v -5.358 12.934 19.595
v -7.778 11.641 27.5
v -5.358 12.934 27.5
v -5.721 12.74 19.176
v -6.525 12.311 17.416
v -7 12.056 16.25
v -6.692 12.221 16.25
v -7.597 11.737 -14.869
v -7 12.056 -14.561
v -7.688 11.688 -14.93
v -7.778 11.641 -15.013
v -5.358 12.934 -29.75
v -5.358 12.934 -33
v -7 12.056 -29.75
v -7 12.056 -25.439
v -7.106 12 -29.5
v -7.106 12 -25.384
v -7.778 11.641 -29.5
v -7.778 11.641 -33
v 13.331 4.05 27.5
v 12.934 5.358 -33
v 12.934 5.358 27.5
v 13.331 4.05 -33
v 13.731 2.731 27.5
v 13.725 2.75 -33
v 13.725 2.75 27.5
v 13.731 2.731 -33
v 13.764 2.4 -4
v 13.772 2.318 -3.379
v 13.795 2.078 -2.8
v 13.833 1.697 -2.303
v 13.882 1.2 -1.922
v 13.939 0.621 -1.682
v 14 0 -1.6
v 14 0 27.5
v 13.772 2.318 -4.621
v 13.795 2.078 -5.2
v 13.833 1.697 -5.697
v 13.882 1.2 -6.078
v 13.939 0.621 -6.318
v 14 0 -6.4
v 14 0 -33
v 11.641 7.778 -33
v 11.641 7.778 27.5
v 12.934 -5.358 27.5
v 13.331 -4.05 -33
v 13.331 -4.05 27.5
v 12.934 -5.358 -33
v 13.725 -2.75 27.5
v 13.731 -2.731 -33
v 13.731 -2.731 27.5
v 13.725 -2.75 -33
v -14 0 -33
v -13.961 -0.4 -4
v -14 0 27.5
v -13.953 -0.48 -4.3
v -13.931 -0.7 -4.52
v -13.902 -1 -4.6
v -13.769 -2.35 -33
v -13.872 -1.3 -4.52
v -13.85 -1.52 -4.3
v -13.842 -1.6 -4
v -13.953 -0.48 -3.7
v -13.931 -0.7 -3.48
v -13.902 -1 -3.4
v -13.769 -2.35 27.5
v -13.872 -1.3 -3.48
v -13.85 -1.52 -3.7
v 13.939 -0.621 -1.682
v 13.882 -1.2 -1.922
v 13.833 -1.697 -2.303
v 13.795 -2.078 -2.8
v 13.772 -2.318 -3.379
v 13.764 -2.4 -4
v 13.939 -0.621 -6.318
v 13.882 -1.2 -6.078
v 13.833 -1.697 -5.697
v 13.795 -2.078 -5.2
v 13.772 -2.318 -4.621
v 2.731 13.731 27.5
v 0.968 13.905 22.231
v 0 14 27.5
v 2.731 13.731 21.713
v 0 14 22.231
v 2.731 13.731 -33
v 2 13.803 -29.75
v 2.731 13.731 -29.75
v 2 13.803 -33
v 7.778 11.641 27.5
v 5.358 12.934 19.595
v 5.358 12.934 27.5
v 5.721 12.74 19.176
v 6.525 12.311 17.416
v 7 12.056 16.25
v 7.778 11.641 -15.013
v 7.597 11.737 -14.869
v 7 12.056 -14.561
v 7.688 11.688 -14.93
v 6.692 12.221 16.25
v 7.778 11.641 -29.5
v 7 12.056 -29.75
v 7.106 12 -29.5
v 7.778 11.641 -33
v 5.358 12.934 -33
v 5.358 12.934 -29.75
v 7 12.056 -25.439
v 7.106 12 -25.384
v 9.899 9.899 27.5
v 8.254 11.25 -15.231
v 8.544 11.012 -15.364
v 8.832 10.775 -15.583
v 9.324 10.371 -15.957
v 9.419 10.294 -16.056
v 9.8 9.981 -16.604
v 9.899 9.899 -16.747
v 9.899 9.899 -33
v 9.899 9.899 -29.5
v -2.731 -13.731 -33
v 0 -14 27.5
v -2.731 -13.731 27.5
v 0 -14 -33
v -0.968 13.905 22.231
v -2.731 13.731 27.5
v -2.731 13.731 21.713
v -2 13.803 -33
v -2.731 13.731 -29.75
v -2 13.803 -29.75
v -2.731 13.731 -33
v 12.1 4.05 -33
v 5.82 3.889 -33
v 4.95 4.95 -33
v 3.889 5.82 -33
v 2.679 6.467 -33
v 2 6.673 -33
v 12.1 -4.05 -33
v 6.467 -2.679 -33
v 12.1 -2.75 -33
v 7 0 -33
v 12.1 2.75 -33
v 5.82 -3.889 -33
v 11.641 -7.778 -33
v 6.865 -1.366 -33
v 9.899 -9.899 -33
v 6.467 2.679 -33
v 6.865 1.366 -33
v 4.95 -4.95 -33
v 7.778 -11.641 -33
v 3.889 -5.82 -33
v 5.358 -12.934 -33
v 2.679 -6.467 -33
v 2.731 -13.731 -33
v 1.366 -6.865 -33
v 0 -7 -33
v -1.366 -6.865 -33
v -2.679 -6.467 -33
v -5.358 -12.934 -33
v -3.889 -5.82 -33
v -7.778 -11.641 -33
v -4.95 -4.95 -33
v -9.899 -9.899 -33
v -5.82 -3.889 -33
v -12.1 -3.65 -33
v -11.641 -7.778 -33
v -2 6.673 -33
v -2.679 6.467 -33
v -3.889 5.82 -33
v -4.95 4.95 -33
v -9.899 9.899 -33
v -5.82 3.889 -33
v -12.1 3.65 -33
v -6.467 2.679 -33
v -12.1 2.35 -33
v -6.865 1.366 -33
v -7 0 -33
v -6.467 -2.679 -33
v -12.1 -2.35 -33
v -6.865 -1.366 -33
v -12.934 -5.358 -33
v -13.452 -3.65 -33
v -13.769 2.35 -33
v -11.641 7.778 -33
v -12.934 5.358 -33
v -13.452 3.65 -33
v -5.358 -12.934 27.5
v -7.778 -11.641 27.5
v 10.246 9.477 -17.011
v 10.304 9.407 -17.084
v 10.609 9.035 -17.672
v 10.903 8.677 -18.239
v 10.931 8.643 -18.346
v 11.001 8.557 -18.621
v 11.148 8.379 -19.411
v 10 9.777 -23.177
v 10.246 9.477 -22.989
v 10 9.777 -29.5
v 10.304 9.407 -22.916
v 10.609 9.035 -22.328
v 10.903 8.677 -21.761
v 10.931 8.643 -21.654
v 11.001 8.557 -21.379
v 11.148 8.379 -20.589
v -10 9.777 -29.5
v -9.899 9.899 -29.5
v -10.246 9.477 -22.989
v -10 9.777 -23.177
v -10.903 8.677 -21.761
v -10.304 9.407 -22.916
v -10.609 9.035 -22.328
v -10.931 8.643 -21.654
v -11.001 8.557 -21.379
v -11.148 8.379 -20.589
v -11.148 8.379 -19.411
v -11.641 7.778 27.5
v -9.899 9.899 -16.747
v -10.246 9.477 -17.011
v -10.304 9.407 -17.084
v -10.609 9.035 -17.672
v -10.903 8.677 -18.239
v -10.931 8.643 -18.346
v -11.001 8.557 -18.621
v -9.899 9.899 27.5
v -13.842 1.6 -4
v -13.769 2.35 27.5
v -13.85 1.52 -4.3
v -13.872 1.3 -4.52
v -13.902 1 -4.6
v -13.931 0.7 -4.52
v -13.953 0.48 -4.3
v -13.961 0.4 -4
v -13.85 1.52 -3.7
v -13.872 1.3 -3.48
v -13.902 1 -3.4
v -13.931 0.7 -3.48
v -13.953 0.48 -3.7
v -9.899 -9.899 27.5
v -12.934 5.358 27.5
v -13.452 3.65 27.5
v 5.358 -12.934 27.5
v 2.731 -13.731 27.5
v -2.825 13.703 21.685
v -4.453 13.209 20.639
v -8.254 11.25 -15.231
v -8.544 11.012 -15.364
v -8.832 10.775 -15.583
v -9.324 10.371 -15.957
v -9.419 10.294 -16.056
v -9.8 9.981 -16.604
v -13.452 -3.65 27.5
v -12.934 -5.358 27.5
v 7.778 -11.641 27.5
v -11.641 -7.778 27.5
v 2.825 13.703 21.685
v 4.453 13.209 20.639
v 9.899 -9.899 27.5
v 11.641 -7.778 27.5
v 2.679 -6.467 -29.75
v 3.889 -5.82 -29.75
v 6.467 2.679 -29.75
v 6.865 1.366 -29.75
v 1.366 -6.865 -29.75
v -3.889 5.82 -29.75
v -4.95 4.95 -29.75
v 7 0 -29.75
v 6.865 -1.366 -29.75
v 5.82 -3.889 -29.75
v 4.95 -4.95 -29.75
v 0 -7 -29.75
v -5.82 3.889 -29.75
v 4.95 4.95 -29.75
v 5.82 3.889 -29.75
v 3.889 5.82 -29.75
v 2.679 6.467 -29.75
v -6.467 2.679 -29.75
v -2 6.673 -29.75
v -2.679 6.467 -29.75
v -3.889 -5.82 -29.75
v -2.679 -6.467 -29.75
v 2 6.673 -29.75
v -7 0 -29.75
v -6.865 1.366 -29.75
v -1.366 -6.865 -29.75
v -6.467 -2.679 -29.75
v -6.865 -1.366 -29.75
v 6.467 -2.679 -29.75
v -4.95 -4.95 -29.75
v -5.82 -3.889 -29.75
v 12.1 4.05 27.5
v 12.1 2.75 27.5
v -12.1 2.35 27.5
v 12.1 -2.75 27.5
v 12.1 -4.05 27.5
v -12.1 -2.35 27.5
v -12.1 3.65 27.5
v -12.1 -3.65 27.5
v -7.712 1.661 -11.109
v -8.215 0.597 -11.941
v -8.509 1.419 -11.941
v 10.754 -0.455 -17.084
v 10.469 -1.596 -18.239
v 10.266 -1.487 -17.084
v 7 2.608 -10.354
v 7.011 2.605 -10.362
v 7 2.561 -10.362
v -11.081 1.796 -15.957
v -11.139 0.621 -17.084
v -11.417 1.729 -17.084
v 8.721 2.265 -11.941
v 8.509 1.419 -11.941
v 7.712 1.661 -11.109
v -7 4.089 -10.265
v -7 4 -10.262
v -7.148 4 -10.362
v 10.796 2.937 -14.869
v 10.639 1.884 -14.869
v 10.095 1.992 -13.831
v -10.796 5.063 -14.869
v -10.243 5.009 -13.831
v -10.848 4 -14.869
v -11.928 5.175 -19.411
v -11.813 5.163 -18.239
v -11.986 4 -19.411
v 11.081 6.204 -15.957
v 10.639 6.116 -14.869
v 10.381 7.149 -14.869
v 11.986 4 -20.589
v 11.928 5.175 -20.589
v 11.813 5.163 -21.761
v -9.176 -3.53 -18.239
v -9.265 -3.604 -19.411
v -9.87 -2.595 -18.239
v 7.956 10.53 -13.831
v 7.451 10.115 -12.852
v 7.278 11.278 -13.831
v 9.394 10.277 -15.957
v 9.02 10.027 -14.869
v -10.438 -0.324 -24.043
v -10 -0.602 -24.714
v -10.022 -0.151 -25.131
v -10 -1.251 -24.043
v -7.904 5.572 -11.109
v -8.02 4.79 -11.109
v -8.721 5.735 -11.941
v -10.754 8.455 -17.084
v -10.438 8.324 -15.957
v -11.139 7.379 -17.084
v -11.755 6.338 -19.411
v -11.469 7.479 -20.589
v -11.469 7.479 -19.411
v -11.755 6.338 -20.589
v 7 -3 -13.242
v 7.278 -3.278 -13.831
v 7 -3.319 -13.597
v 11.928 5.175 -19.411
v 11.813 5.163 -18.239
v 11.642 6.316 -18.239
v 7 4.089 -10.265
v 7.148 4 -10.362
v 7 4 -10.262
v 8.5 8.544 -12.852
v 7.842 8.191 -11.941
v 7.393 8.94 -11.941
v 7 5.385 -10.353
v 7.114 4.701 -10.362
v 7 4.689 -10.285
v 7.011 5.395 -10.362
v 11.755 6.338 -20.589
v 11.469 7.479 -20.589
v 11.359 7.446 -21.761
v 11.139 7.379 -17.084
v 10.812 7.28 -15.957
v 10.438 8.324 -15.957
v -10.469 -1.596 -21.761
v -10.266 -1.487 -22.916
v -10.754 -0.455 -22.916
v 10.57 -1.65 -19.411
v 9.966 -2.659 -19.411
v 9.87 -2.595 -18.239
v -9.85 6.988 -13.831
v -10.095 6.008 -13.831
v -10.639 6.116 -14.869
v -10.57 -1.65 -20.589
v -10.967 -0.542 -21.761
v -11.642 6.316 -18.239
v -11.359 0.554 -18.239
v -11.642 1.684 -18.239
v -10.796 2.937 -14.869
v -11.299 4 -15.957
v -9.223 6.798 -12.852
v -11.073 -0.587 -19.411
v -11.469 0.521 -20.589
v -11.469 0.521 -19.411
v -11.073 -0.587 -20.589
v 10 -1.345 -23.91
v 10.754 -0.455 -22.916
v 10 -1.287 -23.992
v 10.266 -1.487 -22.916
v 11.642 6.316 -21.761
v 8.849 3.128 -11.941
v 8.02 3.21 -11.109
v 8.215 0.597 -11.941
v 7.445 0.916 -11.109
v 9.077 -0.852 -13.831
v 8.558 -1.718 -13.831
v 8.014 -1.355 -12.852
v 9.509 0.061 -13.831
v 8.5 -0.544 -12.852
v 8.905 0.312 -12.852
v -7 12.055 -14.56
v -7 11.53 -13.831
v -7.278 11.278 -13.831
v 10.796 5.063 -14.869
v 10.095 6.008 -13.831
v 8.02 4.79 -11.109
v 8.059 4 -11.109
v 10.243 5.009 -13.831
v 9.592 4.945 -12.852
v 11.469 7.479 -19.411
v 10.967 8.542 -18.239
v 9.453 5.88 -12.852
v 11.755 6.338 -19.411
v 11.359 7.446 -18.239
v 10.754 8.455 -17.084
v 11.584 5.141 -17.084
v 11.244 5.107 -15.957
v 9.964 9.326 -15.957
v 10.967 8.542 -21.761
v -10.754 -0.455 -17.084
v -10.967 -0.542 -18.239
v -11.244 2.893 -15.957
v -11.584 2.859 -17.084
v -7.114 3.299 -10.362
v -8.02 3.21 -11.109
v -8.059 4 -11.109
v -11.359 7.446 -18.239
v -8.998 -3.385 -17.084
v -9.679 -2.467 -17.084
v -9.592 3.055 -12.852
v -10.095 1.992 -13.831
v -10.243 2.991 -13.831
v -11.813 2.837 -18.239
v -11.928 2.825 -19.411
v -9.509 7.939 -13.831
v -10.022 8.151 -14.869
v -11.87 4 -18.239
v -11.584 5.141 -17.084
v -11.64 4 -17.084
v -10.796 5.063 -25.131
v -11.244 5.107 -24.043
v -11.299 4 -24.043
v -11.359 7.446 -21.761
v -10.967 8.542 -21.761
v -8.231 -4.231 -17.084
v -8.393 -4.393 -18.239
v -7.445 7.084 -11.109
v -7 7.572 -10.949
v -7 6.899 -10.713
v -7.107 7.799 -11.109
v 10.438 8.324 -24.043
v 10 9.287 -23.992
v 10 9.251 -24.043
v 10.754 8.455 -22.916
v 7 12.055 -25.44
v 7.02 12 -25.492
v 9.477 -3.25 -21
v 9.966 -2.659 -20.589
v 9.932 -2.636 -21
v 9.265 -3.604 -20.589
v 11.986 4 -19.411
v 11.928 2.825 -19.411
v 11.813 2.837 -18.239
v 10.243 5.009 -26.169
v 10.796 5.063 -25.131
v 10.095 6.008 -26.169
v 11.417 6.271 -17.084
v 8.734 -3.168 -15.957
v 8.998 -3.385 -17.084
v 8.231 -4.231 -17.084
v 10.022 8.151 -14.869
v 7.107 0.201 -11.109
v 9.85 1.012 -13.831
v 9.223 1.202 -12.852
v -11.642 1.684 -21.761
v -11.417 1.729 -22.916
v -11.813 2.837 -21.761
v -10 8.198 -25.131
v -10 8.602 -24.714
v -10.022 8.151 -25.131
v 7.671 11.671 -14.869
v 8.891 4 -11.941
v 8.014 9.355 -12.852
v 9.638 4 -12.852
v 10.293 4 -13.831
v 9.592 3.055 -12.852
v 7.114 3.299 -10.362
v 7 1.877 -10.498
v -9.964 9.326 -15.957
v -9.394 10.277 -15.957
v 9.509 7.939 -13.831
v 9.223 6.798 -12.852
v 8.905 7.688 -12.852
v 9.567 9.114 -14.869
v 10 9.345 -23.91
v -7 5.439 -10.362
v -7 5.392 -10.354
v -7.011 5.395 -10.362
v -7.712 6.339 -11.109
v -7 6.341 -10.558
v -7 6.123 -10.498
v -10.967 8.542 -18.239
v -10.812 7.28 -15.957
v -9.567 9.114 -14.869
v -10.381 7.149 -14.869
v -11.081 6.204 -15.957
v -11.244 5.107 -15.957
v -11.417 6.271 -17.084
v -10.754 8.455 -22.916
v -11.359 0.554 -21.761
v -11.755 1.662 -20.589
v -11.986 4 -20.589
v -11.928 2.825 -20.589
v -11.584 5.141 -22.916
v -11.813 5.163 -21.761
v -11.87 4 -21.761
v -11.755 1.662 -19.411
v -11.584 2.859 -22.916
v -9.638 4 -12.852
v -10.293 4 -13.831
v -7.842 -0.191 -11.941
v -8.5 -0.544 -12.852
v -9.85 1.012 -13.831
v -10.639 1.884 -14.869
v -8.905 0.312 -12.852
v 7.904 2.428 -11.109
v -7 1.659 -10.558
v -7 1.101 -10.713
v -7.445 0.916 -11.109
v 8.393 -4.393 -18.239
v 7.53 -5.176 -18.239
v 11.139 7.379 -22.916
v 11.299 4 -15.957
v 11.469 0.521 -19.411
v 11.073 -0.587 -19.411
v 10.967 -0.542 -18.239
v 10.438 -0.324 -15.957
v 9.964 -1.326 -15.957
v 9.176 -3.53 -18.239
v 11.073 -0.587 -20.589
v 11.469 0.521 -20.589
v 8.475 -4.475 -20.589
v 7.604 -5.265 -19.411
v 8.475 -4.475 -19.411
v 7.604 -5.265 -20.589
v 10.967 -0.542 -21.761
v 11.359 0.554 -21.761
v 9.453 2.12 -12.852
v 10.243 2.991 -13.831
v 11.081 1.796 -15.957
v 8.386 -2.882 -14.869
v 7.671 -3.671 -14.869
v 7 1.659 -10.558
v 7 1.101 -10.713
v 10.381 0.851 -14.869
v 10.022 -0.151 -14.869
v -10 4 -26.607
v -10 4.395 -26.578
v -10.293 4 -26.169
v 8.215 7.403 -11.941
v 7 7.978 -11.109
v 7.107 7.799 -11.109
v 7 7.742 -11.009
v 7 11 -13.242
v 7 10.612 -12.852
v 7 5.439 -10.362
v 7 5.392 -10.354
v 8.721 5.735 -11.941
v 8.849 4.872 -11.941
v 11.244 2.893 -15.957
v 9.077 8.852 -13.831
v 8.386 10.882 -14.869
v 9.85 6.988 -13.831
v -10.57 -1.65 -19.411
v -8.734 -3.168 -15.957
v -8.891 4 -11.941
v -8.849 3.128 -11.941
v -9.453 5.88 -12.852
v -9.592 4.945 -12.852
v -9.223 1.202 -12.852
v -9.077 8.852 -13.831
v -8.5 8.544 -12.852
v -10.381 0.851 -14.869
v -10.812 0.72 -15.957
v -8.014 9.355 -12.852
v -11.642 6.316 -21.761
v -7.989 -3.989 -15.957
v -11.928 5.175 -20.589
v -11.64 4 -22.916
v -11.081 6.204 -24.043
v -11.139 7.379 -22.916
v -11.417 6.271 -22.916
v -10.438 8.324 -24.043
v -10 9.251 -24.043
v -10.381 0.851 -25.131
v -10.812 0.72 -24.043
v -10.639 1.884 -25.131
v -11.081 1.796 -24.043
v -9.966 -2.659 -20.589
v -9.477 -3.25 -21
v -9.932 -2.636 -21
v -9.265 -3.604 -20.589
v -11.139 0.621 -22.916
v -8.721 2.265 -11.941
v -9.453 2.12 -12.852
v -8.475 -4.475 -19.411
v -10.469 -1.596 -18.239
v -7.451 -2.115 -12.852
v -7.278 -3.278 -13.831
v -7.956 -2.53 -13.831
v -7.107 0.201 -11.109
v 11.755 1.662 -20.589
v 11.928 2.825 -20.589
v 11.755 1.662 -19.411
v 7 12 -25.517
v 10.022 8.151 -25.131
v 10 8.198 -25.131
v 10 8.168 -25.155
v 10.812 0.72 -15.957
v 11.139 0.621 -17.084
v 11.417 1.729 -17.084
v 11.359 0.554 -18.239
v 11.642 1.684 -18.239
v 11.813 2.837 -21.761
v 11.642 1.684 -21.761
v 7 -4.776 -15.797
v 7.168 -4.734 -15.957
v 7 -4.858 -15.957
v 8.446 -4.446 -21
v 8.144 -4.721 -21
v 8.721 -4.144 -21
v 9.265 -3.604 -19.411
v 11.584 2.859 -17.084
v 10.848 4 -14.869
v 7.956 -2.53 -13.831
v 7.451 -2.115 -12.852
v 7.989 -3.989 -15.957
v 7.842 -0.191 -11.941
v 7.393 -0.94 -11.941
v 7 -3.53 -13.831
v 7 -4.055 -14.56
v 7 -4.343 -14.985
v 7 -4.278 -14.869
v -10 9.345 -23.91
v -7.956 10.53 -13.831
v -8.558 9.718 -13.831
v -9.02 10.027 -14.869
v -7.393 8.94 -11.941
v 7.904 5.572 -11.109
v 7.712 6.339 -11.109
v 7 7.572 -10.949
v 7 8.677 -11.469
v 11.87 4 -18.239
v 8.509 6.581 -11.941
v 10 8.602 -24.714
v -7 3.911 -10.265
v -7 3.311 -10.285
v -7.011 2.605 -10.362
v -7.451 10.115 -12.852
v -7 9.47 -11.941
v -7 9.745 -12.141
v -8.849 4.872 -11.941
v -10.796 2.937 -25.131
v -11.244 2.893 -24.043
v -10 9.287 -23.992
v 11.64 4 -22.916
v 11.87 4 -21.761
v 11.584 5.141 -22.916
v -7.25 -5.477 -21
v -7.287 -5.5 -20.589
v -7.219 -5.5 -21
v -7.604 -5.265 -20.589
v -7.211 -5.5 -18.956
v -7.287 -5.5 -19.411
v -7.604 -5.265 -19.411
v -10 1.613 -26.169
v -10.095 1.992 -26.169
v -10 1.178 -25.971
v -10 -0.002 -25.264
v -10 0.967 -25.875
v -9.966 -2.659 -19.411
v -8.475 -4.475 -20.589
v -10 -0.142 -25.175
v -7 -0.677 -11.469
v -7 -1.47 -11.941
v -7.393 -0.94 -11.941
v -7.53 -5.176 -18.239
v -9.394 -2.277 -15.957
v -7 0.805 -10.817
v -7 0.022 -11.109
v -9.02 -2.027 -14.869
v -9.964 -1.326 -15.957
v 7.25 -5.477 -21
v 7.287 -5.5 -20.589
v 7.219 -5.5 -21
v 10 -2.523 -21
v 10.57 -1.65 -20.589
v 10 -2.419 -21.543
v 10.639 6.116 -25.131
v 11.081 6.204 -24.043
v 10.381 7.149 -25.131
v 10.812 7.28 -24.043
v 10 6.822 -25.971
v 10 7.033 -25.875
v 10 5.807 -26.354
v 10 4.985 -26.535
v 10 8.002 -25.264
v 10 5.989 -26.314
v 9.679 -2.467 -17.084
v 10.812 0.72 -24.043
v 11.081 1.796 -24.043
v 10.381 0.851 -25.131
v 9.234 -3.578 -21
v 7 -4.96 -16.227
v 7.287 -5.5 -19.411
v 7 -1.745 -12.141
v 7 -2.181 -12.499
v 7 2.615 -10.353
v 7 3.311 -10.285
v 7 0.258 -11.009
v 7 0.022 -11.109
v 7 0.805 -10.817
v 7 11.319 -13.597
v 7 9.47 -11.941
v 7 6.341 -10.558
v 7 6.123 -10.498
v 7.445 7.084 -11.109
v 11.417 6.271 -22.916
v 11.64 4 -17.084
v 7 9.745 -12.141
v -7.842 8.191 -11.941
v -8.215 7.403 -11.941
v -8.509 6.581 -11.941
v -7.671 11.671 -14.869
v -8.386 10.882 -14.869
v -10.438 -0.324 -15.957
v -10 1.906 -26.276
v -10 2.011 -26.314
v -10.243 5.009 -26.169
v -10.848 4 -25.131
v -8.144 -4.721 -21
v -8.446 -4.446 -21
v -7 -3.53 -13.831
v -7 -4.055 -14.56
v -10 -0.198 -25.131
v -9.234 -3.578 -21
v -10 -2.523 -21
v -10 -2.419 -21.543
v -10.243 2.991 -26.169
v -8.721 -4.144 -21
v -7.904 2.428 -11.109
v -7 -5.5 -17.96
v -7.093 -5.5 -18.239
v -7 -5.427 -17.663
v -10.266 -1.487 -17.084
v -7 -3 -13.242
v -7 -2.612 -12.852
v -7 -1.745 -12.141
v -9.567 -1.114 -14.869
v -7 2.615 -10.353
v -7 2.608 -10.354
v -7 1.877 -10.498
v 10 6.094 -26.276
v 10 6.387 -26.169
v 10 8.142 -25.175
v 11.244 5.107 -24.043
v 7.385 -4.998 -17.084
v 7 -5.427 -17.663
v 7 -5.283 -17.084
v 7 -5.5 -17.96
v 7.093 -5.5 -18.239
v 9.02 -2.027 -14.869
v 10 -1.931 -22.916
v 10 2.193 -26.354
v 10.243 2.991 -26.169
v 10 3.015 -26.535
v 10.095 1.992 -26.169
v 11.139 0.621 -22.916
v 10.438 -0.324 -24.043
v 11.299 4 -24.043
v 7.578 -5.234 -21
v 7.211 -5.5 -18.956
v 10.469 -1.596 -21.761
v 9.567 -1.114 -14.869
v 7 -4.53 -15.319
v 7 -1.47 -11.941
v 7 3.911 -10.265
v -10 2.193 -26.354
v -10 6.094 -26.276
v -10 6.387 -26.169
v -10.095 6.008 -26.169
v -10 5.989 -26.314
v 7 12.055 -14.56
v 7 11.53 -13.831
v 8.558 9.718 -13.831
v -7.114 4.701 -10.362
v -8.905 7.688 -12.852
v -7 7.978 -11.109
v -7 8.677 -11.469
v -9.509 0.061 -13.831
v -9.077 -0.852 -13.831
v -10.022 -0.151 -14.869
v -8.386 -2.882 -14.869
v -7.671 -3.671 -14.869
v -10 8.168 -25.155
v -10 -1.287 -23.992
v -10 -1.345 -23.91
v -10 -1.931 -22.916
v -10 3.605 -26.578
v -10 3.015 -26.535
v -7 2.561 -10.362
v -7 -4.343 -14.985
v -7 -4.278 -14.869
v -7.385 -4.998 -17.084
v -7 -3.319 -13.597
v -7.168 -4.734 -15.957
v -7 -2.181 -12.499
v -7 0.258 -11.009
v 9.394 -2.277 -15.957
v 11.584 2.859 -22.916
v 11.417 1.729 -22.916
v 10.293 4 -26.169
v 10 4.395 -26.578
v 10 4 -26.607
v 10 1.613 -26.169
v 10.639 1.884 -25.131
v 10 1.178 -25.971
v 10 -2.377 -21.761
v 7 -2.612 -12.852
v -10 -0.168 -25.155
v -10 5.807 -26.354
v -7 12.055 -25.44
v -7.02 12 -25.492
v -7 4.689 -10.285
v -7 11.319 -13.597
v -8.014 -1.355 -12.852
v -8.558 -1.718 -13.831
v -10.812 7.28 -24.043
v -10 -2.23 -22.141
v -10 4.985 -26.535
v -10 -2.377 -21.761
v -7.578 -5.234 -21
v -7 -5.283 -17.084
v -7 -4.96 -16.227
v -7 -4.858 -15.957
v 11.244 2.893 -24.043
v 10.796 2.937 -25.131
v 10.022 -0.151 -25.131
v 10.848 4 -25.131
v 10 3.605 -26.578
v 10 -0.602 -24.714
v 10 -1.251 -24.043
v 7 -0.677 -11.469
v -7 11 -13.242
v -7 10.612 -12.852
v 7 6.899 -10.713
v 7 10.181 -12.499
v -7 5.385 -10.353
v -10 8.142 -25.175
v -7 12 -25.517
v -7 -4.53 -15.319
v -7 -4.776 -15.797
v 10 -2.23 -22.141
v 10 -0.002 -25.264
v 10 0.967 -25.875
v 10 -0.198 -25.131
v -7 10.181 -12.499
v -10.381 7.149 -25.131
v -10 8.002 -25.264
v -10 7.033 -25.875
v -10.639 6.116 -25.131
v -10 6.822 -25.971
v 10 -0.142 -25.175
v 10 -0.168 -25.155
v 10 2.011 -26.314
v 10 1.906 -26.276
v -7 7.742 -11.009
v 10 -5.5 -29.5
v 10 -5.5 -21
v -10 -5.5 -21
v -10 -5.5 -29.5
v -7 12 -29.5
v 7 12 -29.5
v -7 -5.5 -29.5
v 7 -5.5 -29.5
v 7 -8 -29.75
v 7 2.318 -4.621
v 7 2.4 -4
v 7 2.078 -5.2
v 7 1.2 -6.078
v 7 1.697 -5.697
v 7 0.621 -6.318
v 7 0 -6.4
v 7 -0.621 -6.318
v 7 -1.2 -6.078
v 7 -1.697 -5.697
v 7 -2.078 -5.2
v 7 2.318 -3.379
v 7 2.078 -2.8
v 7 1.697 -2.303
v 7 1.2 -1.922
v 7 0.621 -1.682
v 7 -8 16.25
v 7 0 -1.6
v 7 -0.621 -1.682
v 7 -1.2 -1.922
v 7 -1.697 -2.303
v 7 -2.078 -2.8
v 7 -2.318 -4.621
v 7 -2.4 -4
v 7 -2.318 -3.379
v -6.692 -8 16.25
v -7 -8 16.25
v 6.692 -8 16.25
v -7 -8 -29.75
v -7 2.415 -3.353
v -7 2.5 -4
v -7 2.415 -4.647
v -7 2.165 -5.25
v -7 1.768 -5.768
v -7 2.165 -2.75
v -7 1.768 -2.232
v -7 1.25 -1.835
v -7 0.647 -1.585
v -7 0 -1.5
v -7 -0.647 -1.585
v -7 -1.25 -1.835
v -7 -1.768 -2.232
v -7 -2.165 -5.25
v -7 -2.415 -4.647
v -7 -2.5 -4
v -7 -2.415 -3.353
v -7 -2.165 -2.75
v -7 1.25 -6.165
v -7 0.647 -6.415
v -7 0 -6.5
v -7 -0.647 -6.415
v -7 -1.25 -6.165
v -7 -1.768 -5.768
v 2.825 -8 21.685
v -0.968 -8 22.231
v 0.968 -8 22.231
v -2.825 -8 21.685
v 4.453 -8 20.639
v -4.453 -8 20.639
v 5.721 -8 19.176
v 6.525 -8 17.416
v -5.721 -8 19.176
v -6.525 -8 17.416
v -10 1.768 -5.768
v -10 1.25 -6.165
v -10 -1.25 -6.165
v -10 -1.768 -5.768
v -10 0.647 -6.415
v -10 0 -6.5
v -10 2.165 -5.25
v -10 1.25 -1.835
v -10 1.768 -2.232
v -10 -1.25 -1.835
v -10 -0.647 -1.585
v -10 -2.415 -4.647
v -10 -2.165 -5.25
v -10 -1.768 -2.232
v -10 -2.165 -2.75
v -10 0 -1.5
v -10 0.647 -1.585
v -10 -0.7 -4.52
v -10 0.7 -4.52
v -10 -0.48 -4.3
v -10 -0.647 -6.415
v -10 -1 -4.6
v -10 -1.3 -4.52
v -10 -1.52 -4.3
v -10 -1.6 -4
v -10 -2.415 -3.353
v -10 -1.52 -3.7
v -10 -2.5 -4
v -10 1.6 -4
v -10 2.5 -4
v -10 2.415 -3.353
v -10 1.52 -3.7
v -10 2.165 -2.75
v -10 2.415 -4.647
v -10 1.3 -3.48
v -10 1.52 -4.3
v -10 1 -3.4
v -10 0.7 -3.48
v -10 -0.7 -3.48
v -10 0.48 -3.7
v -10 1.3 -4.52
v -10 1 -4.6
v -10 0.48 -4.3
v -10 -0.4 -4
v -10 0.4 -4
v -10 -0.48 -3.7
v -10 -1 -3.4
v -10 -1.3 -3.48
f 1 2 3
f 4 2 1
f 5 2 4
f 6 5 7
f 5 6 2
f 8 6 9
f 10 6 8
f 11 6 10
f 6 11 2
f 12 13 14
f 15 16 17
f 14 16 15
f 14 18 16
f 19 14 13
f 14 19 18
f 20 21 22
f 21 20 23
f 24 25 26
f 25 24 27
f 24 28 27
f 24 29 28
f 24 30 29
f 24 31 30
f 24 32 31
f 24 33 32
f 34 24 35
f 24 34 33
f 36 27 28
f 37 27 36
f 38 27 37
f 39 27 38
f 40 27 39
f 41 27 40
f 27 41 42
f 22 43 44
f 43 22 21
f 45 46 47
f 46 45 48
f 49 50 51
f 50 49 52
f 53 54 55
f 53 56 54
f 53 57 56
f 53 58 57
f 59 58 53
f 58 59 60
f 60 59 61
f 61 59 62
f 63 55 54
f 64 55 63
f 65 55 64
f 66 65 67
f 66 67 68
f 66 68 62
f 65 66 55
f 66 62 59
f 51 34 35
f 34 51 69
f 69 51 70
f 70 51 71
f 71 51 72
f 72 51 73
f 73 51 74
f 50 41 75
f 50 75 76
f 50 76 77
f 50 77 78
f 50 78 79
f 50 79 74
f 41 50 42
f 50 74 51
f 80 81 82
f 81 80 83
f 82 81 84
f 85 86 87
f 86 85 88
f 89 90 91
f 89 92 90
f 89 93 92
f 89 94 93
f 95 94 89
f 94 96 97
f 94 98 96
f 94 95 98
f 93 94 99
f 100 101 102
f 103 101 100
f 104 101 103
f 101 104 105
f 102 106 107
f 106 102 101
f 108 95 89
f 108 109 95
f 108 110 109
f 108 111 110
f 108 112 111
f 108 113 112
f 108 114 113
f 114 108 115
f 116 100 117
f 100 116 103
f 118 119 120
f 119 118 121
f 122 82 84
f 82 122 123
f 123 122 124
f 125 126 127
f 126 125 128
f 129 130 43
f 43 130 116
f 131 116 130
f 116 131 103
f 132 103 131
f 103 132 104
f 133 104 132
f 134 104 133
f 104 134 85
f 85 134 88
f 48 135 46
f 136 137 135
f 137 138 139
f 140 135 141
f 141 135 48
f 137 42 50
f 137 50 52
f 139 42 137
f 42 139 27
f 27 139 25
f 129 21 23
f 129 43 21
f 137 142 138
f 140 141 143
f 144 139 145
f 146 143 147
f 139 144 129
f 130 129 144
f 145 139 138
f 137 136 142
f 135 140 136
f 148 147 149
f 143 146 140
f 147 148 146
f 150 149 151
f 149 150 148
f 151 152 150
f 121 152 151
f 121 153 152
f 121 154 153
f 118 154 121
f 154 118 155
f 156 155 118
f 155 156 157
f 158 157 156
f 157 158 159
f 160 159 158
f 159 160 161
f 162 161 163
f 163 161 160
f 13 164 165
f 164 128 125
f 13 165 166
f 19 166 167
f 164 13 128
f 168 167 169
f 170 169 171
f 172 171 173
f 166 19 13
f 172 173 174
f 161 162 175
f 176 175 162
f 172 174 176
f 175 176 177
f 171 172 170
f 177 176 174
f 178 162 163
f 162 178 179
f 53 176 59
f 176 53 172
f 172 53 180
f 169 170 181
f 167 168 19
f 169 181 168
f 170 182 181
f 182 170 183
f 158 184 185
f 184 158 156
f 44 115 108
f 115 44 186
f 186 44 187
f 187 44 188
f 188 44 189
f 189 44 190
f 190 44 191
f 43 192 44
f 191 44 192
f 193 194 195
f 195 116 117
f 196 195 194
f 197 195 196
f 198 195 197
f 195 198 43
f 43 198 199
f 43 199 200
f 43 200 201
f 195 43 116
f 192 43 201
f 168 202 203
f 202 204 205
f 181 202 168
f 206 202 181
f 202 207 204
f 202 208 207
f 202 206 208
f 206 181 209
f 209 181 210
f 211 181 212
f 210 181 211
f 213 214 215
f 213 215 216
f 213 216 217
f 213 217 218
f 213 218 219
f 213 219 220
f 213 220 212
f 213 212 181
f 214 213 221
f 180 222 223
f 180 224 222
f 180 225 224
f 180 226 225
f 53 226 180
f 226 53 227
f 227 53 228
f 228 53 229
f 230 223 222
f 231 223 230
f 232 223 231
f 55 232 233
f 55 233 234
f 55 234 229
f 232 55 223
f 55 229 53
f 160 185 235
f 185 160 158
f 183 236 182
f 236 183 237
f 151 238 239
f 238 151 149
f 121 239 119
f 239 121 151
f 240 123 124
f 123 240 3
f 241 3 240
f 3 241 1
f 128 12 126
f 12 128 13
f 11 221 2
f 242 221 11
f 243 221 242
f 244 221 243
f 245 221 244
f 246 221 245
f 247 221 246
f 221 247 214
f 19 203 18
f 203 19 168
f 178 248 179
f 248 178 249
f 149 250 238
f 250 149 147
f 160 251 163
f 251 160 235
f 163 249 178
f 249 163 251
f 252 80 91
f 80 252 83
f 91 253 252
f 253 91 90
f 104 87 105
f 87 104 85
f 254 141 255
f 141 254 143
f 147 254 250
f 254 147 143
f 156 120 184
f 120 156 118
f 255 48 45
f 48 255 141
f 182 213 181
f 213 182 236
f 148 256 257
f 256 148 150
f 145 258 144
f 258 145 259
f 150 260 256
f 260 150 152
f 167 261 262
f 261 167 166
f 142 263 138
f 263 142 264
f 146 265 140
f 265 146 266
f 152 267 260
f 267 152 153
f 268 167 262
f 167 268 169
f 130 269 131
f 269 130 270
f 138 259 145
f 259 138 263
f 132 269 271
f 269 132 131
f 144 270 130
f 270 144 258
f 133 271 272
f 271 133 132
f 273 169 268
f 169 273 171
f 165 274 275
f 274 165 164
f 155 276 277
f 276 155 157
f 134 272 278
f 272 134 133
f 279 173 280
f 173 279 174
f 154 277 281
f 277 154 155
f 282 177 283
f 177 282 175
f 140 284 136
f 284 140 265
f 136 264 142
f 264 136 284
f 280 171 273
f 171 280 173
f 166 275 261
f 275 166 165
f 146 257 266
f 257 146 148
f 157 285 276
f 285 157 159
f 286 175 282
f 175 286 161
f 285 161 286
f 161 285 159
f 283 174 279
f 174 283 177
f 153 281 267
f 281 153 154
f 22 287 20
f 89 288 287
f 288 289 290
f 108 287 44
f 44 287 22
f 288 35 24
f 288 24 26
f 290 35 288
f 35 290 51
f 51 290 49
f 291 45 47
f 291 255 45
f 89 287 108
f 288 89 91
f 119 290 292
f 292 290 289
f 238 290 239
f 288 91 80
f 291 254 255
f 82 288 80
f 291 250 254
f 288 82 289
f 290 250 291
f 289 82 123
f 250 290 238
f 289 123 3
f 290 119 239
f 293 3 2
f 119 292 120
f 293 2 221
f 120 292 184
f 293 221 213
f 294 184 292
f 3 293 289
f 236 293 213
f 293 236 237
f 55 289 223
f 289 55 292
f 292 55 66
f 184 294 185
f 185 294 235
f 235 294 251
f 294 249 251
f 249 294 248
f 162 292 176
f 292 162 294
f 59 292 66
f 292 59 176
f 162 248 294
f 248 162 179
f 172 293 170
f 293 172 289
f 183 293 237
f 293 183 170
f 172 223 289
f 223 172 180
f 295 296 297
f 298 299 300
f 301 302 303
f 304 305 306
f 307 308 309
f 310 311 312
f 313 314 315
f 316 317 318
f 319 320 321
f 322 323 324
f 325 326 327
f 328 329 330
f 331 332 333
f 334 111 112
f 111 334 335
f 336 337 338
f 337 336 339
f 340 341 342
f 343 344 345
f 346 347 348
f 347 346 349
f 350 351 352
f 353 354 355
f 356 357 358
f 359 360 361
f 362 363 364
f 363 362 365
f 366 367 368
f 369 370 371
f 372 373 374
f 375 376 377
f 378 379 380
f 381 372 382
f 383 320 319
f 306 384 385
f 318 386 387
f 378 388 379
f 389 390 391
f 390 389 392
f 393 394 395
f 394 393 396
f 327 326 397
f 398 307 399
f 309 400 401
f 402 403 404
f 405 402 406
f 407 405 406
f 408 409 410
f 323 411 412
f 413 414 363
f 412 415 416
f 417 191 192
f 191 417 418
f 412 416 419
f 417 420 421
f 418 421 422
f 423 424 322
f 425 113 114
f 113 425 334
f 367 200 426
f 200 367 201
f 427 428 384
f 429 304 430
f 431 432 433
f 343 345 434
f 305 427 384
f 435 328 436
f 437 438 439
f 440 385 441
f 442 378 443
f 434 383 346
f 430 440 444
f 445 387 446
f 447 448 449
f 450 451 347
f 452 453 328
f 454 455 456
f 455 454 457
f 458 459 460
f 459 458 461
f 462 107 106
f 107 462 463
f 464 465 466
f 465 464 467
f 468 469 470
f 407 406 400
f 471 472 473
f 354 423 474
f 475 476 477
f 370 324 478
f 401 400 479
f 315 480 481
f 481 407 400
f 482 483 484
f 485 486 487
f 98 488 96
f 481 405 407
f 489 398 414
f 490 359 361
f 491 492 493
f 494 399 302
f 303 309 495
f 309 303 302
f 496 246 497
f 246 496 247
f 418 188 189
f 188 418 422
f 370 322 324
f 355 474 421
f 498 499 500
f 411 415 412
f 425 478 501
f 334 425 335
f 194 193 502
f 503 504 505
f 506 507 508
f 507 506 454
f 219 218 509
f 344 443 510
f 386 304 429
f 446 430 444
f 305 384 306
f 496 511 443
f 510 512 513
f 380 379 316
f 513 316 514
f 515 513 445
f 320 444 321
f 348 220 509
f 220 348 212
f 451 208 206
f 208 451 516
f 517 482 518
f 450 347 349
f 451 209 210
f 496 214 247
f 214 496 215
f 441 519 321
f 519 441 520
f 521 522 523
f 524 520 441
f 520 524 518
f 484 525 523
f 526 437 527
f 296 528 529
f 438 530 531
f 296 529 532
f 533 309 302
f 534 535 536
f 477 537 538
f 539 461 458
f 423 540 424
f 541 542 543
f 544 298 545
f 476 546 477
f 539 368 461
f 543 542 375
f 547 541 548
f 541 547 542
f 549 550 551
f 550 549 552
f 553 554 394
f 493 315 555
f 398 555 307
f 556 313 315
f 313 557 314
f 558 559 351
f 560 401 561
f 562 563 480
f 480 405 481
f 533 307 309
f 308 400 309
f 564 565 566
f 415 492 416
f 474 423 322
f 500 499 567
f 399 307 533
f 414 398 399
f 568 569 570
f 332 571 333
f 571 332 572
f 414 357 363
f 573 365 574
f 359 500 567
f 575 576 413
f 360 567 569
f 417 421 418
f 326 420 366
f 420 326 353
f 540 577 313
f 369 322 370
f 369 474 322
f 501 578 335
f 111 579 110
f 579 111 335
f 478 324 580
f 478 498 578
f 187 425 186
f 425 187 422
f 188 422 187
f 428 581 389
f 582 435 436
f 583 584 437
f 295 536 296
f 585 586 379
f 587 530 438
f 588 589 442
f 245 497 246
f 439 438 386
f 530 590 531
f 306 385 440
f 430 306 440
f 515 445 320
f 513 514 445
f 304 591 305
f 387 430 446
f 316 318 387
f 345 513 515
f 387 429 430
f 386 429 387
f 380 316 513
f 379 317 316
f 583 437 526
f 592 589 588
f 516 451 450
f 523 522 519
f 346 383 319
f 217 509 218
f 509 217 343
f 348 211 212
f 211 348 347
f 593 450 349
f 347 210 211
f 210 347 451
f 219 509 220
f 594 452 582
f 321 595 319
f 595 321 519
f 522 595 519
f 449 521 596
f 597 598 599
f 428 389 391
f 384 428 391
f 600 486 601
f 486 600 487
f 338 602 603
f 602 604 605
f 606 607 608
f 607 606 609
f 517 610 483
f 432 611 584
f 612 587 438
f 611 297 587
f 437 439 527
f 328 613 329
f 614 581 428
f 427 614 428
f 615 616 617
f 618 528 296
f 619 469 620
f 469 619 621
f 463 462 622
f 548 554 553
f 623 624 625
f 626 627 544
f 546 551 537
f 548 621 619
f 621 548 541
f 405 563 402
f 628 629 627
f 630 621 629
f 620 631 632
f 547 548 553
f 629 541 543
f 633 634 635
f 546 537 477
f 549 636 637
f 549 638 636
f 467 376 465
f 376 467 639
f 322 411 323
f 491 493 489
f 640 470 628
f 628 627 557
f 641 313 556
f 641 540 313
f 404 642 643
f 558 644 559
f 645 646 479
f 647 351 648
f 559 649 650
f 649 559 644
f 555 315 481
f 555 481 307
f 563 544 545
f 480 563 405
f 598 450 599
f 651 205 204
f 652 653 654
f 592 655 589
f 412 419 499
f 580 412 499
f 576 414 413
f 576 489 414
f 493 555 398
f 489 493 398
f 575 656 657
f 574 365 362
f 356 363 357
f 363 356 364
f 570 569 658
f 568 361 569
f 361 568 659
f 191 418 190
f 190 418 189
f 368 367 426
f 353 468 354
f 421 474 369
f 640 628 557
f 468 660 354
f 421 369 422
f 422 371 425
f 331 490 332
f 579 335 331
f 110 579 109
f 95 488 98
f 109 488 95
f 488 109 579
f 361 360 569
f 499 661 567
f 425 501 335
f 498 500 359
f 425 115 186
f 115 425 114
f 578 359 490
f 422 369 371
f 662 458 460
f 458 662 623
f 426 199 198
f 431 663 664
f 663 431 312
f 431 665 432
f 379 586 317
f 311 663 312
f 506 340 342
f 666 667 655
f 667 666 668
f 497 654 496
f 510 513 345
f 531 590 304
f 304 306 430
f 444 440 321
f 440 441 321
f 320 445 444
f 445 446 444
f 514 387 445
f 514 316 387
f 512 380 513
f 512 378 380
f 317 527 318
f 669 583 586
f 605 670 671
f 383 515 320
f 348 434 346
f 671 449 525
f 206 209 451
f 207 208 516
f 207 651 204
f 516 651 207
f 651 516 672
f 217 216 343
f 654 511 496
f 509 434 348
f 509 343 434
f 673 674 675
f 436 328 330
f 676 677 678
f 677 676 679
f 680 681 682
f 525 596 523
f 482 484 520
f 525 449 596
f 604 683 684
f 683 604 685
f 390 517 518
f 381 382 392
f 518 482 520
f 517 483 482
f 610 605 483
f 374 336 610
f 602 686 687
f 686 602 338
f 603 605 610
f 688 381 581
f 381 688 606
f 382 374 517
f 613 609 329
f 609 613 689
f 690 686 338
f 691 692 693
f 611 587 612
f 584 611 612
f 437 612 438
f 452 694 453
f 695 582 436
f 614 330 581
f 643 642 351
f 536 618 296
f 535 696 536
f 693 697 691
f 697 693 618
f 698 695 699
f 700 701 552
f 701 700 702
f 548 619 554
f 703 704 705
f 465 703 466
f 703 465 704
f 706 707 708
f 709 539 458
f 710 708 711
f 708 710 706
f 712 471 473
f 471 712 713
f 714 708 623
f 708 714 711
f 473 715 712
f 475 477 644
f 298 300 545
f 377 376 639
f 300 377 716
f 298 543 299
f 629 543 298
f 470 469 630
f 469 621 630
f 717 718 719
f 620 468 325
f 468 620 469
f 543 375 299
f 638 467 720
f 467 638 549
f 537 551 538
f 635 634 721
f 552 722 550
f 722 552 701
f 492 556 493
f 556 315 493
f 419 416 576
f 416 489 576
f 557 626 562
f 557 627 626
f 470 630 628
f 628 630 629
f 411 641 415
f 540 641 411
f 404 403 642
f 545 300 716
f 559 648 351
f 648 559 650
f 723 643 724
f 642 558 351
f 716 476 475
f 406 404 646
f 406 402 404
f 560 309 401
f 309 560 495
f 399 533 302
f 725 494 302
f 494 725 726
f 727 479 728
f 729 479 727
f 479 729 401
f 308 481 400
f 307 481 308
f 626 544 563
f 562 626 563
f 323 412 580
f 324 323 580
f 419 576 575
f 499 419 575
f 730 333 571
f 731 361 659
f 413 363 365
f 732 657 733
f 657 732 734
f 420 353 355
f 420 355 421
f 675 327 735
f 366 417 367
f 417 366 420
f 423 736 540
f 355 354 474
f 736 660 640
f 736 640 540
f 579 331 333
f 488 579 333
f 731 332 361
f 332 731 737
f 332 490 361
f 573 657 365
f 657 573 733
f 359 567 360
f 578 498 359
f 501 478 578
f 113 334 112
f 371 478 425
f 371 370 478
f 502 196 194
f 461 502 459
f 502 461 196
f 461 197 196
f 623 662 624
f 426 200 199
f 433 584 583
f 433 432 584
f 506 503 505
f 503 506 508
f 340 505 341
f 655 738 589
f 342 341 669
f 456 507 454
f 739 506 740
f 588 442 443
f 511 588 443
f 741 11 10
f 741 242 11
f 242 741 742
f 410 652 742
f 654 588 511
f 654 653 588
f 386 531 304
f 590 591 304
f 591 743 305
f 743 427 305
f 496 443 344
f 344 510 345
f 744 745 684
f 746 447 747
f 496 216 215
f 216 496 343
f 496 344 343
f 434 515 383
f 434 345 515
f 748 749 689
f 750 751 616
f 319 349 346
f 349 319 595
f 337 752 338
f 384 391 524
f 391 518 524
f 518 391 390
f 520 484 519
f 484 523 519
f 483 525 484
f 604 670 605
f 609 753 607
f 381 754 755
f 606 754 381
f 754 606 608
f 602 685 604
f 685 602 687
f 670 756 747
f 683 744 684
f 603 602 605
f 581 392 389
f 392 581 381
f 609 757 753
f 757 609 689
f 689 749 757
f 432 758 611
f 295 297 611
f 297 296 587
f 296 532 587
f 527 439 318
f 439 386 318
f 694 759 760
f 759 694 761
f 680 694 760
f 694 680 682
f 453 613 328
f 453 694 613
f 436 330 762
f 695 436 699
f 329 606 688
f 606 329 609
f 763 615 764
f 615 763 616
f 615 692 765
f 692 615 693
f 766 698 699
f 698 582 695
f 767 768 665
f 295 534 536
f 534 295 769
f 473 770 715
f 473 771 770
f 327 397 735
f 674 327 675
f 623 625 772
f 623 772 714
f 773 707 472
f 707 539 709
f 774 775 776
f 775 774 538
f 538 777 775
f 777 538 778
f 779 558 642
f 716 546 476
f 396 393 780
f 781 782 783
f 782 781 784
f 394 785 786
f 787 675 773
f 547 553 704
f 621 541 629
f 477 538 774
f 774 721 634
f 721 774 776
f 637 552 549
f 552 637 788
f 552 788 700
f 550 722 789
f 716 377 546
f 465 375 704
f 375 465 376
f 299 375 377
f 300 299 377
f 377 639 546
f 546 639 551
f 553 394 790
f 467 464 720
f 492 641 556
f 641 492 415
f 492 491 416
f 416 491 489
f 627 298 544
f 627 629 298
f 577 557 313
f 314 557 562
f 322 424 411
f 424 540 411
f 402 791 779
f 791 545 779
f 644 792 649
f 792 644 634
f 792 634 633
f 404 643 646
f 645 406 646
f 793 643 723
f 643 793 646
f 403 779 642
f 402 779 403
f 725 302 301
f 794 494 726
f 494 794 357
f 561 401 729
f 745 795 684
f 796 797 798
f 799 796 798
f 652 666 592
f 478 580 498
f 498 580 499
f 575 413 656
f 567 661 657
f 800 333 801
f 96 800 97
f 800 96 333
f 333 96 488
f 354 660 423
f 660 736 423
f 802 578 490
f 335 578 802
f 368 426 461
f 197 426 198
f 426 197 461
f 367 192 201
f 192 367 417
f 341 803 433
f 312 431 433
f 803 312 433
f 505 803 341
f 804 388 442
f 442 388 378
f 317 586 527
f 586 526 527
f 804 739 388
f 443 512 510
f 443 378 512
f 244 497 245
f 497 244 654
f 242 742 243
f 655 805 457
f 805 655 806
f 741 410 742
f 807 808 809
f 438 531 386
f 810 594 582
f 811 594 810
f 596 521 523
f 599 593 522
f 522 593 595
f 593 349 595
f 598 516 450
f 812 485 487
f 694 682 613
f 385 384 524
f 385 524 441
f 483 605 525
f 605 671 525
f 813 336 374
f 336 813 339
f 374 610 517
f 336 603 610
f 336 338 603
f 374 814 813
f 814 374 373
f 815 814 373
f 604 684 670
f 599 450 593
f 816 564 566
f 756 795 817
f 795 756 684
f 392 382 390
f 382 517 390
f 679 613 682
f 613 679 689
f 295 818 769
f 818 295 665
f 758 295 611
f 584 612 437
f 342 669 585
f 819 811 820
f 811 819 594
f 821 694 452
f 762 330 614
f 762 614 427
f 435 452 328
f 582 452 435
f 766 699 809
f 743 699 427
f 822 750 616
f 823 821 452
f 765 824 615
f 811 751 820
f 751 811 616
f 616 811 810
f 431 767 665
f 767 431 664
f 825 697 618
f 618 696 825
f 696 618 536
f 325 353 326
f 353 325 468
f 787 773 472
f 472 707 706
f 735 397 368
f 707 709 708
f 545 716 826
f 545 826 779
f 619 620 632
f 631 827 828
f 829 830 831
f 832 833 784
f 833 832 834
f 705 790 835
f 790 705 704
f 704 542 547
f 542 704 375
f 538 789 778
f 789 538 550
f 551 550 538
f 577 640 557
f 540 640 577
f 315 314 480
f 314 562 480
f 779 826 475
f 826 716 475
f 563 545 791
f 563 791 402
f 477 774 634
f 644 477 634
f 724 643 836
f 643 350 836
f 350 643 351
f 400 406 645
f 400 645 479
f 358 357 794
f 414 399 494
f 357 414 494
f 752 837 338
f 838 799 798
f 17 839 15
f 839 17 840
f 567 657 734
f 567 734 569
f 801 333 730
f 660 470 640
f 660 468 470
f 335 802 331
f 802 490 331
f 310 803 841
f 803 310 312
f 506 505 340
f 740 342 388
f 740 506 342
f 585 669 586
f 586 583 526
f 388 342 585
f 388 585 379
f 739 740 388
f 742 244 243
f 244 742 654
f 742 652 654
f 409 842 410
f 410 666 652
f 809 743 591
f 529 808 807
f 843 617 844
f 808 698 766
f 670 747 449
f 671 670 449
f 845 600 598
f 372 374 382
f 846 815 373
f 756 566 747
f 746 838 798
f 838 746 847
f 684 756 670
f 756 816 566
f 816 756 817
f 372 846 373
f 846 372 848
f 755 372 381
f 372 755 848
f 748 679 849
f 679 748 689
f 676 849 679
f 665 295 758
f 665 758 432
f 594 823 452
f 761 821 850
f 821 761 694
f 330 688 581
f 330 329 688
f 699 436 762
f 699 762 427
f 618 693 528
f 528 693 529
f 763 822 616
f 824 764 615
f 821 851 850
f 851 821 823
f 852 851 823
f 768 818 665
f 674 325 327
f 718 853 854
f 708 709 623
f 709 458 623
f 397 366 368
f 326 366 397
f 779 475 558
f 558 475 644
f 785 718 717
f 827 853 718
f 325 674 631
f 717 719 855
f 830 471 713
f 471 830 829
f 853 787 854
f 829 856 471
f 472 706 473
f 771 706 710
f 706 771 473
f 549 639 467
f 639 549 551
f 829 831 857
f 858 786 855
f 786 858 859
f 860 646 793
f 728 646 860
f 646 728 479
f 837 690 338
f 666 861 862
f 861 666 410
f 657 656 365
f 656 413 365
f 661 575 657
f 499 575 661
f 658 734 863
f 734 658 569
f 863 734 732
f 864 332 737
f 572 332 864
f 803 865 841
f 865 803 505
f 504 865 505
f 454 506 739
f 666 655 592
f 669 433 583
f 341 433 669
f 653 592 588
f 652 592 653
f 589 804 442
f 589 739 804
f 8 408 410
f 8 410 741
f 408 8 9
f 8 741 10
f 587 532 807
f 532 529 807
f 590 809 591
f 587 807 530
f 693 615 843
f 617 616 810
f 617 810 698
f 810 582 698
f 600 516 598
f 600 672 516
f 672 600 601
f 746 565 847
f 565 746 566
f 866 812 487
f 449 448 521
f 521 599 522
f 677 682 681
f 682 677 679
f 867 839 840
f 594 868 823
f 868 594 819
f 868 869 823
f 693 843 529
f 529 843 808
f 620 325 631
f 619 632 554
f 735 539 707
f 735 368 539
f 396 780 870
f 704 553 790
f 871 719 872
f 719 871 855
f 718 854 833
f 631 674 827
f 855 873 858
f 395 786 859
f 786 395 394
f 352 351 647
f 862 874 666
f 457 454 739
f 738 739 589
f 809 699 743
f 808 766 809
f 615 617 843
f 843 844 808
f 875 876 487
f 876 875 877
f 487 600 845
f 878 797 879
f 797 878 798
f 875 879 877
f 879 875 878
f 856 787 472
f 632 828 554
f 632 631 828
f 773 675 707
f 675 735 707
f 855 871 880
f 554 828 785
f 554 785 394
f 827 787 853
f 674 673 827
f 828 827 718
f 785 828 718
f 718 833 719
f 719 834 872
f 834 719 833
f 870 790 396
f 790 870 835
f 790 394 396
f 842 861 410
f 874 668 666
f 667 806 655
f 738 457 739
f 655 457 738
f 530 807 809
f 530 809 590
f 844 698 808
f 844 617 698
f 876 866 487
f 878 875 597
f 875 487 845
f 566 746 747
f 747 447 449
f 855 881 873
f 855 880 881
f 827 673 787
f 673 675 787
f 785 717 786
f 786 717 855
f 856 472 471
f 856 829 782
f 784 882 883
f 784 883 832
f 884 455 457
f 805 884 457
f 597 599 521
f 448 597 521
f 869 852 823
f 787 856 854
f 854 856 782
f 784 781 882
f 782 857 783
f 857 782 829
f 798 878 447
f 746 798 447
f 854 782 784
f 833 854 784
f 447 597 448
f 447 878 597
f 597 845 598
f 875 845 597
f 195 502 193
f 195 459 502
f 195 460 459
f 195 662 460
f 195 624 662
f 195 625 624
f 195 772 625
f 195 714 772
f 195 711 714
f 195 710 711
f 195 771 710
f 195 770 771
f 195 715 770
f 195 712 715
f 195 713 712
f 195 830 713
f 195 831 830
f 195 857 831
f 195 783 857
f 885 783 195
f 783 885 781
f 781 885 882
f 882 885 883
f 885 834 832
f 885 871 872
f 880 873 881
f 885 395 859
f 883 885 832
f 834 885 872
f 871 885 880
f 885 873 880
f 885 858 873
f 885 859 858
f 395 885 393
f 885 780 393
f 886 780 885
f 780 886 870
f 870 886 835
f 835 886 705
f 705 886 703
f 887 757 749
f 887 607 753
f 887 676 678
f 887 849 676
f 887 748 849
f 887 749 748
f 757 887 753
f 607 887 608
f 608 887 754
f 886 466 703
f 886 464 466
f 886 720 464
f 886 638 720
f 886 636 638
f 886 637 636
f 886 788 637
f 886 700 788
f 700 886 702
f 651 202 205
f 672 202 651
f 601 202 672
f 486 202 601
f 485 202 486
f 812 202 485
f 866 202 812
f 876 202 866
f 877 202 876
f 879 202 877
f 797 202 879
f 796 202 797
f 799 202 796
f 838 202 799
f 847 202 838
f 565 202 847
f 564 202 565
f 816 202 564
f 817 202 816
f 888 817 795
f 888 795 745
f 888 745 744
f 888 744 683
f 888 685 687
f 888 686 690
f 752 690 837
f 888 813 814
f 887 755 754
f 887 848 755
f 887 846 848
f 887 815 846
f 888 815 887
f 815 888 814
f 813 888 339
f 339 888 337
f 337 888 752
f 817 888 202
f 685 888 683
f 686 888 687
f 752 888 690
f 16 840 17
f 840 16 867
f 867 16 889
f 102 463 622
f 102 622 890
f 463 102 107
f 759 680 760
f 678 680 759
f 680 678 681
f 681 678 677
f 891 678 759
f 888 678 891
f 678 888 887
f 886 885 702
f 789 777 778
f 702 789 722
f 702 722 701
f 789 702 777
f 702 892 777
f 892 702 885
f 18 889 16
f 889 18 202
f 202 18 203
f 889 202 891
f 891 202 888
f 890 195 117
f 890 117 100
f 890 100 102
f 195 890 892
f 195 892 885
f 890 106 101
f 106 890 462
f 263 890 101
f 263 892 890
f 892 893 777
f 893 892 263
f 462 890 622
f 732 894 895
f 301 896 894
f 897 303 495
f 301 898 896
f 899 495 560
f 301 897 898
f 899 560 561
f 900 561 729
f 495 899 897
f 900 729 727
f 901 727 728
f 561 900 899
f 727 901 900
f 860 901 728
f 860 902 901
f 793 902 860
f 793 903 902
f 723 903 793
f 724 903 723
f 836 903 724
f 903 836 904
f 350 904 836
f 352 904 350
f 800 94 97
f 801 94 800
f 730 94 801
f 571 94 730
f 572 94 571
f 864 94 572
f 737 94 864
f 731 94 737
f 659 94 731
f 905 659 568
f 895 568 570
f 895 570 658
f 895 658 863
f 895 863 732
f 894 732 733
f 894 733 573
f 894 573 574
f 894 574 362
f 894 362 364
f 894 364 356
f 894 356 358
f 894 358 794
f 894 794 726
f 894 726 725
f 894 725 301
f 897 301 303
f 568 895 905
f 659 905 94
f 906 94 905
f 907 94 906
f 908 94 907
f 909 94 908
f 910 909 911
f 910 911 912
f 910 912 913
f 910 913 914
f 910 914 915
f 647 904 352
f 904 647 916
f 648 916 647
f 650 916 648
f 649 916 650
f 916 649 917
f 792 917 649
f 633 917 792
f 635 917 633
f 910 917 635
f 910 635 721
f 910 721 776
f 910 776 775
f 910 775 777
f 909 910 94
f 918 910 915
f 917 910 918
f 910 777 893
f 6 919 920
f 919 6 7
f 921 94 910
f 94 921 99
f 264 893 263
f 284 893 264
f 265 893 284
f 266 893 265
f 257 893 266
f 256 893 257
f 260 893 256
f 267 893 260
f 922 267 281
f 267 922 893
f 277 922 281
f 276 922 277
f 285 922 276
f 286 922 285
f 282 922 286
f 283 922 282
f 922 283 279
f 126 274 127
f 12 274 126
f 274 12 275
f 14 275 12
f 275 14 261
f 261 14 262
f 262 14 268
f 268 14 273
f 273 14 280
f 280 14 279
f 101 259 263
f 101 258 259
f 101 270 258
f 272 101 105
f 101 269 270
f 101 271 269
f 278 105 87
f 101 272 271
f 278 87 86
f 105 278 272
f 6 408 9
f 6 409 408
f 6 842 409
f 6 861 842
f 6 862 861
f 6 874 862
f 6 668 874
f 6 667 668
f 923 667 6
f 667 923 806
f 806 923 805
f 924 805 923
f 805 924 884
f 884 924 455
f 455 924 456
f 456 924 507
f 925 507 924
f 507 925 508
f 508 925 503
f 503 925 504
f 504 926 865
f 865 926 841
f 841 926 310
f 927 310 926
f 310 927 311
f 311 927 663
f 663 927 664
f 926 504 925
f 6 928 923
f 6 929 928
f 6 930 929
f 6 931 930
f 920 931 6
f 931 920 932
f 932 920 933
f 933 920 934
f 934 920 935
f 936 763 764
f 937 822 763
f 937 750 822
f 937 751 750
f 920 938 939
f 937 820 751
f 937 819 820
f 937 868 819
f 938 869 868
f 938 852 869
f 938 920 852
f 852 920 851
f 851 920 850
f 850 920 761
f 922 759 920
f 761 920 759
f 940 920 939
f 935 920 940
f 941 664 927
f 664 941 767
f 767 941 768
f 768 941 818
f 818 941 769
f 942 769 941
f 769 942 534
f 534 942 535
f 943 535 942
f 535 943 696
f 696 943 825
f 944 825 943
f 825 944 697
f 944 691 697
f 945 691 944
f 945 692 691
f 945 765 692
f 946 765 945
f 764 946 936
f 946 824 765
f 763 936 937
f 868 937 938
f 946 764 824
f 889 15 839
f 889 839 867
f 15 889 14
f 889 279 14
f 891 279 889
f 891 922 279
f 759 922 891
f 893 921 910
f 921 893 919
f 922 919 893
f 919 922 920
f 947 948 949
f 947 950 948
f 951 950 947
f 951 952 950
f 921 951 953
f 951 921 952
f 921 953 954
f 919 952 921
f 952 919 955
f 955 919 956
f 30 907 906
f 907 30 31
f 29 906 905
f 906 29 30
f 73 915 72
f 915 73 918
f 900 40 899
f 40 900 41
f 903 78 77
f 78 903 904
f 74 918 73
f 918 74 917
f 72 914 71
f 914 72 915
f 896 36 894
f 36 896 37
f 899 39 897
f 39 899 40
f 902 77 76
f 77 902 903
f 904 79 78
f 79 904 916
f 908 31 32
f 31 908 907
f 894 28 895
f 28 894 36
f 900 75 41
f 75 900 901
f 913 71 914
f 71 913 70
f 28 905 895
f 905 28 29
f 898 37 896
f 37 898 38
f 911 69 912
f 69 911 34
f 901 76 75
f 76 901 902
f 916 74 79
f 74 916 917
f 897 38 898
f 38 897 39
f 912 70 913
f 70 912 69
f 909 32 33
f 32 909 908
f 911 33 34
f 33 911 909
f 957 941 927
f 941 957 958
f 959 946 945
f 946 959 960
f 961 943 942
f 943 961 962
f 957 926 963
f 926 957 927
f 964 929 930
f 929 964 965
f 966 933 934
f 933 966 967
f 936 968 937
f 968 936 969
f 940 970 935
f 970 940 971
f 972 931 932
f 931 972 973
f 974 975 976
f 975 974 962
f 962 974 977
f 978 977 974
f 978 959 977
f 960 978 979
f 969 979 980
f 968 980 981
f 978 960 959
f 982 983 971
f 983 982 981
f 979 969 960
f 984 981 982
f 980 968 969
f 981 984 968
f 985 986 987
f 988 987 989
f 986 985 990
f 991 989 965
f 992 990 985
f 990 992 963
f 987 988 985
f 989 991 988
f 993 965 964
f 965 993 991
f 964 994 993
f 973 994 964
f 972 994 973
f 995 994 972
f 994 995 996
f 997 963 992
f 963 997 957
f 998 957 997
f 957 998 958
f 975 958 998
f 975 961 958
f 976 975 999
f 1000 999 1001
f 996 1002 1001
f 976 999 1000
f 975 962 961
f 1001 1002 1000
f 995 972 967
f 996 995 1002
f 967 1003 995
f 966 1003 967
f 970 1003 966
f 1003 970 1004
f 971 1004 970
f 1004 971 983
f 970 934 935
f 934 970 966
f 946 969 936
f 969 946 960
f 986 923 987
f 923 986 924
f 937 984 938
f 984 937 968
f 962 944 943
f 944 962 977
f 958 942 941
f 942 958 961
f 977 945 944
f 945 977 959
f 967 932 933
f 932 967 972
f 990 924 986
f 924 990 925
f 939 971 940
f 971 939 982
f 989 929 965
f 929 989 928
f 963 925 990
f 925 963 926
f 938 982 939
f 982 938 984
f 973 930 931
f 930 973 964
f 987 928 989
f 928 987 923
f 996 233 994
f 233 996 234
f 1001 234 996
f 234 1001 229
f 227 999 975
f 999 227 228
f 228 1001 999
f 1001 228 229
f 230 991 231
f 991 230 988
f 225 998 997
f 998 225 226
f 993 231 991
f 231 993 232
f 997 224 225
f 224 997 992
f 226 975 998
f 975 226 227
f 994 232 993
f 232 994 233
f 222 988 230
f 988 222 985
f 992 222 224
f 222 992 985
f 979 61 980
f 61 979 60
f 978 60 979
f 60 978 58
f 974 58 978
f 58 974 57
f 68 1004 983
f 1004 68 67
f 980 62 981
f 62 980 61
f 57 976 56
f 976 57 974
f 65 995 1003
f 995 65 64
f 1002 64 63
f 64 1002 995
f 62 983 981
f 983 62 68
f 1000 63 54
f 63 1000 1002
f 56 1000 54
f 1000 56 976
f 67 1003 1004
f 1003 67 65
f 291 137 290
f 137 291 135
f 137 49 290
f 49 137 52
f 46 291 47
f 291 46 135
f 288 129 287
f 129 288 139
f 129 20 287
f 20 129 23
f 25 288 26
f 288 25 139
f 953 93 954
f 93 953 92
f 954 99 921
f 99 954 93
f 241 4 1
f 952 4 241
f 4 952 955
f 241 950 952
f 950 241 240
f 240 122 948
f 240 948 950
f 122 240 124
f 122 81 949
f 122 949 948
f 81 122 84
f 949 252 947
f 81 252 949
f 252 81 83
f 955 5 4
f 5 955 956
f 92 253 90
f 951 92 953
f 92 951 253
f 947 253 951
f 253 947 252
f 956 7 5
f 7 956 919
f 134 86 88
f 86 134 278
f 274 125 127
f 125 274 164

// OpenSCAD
height = 55;
dia = 28;
ch = 46;

module plug(d) 
{
rad = d/2;
q = d/3;
gz = -height/2;
gh = height;

	difference() 
	{
    union() {
	  cylinder(r=rad, h=height, center=true, $fn=32);

     translate([0,0,-30])
     difference() {
	    cylinder(r=rad, h=6, center=true, $fn=32);
	    cylinder(r=rad/2, h=6, center=true, $fn=32);
      }
     }
	  translate([0,rad/2-4,rad/2-height/4])
		 cube([14,22,ch],center=true);
// LED Hole
     translate([10,0,-4])
     rotate([0,90,0])
          cylinder(r=2.4,h=20,center=true,$fn=24);
// Phototransitor Holes
     translate([-8,0,-4])
     rotate([0,90,0])
          cylinder(r=2.5,h=4,center=true,$fn=24);
     translate([-8,1,-4])
     rotate([0,90,0])
          cylinder(r=0.6,h=16,center=true,$fn=12);
     translate([-8,-1,-4])
     rotate([0,90,0])
          cylinder(r=0.6,h=16,center=true,$fn=12);

// Wire Grooves
     translate([rad-1,-3.4,gz])
          cube([1.8,1.3,2*gh],center=true);
     translate([rad-1,3.4,gz])
          cube([1.8,1.3,2*gh],center=true);

     translate([2-d,0,0]) {
        translate([rad-1,-3,gz])
           cube([1.8,1.3,2*gh],center=true);
        translate([rad-1,3,gz])
           cube([1.8,1.3,2*gh],center=true);
	  }
    translate([0,3,height/2-12])
      rotate([90,0,0])
        cylinder(r=6.8,h=22,center=true);
  translate([0,12,-(3+height/2)])
      cube([4,12,6],center=true);
 translate([0,7,-27]) cav();
  } // End of difference()

}

module cav() {
    difference() {
     union() {
       translate([0,-3,7]) sphere(12,center=true,$fn=64);
       translate([0,-6,1]) cube([20,22,10],center=true);
     }
     translate([0,-20,0]) cube([30,15,30],center=true);
     translate([0,0,-10]) cube([30,30,15],center=true);
  }
}


plug(dia);
//translate([0,0,-7]) cube([4,4,45],center=true);
